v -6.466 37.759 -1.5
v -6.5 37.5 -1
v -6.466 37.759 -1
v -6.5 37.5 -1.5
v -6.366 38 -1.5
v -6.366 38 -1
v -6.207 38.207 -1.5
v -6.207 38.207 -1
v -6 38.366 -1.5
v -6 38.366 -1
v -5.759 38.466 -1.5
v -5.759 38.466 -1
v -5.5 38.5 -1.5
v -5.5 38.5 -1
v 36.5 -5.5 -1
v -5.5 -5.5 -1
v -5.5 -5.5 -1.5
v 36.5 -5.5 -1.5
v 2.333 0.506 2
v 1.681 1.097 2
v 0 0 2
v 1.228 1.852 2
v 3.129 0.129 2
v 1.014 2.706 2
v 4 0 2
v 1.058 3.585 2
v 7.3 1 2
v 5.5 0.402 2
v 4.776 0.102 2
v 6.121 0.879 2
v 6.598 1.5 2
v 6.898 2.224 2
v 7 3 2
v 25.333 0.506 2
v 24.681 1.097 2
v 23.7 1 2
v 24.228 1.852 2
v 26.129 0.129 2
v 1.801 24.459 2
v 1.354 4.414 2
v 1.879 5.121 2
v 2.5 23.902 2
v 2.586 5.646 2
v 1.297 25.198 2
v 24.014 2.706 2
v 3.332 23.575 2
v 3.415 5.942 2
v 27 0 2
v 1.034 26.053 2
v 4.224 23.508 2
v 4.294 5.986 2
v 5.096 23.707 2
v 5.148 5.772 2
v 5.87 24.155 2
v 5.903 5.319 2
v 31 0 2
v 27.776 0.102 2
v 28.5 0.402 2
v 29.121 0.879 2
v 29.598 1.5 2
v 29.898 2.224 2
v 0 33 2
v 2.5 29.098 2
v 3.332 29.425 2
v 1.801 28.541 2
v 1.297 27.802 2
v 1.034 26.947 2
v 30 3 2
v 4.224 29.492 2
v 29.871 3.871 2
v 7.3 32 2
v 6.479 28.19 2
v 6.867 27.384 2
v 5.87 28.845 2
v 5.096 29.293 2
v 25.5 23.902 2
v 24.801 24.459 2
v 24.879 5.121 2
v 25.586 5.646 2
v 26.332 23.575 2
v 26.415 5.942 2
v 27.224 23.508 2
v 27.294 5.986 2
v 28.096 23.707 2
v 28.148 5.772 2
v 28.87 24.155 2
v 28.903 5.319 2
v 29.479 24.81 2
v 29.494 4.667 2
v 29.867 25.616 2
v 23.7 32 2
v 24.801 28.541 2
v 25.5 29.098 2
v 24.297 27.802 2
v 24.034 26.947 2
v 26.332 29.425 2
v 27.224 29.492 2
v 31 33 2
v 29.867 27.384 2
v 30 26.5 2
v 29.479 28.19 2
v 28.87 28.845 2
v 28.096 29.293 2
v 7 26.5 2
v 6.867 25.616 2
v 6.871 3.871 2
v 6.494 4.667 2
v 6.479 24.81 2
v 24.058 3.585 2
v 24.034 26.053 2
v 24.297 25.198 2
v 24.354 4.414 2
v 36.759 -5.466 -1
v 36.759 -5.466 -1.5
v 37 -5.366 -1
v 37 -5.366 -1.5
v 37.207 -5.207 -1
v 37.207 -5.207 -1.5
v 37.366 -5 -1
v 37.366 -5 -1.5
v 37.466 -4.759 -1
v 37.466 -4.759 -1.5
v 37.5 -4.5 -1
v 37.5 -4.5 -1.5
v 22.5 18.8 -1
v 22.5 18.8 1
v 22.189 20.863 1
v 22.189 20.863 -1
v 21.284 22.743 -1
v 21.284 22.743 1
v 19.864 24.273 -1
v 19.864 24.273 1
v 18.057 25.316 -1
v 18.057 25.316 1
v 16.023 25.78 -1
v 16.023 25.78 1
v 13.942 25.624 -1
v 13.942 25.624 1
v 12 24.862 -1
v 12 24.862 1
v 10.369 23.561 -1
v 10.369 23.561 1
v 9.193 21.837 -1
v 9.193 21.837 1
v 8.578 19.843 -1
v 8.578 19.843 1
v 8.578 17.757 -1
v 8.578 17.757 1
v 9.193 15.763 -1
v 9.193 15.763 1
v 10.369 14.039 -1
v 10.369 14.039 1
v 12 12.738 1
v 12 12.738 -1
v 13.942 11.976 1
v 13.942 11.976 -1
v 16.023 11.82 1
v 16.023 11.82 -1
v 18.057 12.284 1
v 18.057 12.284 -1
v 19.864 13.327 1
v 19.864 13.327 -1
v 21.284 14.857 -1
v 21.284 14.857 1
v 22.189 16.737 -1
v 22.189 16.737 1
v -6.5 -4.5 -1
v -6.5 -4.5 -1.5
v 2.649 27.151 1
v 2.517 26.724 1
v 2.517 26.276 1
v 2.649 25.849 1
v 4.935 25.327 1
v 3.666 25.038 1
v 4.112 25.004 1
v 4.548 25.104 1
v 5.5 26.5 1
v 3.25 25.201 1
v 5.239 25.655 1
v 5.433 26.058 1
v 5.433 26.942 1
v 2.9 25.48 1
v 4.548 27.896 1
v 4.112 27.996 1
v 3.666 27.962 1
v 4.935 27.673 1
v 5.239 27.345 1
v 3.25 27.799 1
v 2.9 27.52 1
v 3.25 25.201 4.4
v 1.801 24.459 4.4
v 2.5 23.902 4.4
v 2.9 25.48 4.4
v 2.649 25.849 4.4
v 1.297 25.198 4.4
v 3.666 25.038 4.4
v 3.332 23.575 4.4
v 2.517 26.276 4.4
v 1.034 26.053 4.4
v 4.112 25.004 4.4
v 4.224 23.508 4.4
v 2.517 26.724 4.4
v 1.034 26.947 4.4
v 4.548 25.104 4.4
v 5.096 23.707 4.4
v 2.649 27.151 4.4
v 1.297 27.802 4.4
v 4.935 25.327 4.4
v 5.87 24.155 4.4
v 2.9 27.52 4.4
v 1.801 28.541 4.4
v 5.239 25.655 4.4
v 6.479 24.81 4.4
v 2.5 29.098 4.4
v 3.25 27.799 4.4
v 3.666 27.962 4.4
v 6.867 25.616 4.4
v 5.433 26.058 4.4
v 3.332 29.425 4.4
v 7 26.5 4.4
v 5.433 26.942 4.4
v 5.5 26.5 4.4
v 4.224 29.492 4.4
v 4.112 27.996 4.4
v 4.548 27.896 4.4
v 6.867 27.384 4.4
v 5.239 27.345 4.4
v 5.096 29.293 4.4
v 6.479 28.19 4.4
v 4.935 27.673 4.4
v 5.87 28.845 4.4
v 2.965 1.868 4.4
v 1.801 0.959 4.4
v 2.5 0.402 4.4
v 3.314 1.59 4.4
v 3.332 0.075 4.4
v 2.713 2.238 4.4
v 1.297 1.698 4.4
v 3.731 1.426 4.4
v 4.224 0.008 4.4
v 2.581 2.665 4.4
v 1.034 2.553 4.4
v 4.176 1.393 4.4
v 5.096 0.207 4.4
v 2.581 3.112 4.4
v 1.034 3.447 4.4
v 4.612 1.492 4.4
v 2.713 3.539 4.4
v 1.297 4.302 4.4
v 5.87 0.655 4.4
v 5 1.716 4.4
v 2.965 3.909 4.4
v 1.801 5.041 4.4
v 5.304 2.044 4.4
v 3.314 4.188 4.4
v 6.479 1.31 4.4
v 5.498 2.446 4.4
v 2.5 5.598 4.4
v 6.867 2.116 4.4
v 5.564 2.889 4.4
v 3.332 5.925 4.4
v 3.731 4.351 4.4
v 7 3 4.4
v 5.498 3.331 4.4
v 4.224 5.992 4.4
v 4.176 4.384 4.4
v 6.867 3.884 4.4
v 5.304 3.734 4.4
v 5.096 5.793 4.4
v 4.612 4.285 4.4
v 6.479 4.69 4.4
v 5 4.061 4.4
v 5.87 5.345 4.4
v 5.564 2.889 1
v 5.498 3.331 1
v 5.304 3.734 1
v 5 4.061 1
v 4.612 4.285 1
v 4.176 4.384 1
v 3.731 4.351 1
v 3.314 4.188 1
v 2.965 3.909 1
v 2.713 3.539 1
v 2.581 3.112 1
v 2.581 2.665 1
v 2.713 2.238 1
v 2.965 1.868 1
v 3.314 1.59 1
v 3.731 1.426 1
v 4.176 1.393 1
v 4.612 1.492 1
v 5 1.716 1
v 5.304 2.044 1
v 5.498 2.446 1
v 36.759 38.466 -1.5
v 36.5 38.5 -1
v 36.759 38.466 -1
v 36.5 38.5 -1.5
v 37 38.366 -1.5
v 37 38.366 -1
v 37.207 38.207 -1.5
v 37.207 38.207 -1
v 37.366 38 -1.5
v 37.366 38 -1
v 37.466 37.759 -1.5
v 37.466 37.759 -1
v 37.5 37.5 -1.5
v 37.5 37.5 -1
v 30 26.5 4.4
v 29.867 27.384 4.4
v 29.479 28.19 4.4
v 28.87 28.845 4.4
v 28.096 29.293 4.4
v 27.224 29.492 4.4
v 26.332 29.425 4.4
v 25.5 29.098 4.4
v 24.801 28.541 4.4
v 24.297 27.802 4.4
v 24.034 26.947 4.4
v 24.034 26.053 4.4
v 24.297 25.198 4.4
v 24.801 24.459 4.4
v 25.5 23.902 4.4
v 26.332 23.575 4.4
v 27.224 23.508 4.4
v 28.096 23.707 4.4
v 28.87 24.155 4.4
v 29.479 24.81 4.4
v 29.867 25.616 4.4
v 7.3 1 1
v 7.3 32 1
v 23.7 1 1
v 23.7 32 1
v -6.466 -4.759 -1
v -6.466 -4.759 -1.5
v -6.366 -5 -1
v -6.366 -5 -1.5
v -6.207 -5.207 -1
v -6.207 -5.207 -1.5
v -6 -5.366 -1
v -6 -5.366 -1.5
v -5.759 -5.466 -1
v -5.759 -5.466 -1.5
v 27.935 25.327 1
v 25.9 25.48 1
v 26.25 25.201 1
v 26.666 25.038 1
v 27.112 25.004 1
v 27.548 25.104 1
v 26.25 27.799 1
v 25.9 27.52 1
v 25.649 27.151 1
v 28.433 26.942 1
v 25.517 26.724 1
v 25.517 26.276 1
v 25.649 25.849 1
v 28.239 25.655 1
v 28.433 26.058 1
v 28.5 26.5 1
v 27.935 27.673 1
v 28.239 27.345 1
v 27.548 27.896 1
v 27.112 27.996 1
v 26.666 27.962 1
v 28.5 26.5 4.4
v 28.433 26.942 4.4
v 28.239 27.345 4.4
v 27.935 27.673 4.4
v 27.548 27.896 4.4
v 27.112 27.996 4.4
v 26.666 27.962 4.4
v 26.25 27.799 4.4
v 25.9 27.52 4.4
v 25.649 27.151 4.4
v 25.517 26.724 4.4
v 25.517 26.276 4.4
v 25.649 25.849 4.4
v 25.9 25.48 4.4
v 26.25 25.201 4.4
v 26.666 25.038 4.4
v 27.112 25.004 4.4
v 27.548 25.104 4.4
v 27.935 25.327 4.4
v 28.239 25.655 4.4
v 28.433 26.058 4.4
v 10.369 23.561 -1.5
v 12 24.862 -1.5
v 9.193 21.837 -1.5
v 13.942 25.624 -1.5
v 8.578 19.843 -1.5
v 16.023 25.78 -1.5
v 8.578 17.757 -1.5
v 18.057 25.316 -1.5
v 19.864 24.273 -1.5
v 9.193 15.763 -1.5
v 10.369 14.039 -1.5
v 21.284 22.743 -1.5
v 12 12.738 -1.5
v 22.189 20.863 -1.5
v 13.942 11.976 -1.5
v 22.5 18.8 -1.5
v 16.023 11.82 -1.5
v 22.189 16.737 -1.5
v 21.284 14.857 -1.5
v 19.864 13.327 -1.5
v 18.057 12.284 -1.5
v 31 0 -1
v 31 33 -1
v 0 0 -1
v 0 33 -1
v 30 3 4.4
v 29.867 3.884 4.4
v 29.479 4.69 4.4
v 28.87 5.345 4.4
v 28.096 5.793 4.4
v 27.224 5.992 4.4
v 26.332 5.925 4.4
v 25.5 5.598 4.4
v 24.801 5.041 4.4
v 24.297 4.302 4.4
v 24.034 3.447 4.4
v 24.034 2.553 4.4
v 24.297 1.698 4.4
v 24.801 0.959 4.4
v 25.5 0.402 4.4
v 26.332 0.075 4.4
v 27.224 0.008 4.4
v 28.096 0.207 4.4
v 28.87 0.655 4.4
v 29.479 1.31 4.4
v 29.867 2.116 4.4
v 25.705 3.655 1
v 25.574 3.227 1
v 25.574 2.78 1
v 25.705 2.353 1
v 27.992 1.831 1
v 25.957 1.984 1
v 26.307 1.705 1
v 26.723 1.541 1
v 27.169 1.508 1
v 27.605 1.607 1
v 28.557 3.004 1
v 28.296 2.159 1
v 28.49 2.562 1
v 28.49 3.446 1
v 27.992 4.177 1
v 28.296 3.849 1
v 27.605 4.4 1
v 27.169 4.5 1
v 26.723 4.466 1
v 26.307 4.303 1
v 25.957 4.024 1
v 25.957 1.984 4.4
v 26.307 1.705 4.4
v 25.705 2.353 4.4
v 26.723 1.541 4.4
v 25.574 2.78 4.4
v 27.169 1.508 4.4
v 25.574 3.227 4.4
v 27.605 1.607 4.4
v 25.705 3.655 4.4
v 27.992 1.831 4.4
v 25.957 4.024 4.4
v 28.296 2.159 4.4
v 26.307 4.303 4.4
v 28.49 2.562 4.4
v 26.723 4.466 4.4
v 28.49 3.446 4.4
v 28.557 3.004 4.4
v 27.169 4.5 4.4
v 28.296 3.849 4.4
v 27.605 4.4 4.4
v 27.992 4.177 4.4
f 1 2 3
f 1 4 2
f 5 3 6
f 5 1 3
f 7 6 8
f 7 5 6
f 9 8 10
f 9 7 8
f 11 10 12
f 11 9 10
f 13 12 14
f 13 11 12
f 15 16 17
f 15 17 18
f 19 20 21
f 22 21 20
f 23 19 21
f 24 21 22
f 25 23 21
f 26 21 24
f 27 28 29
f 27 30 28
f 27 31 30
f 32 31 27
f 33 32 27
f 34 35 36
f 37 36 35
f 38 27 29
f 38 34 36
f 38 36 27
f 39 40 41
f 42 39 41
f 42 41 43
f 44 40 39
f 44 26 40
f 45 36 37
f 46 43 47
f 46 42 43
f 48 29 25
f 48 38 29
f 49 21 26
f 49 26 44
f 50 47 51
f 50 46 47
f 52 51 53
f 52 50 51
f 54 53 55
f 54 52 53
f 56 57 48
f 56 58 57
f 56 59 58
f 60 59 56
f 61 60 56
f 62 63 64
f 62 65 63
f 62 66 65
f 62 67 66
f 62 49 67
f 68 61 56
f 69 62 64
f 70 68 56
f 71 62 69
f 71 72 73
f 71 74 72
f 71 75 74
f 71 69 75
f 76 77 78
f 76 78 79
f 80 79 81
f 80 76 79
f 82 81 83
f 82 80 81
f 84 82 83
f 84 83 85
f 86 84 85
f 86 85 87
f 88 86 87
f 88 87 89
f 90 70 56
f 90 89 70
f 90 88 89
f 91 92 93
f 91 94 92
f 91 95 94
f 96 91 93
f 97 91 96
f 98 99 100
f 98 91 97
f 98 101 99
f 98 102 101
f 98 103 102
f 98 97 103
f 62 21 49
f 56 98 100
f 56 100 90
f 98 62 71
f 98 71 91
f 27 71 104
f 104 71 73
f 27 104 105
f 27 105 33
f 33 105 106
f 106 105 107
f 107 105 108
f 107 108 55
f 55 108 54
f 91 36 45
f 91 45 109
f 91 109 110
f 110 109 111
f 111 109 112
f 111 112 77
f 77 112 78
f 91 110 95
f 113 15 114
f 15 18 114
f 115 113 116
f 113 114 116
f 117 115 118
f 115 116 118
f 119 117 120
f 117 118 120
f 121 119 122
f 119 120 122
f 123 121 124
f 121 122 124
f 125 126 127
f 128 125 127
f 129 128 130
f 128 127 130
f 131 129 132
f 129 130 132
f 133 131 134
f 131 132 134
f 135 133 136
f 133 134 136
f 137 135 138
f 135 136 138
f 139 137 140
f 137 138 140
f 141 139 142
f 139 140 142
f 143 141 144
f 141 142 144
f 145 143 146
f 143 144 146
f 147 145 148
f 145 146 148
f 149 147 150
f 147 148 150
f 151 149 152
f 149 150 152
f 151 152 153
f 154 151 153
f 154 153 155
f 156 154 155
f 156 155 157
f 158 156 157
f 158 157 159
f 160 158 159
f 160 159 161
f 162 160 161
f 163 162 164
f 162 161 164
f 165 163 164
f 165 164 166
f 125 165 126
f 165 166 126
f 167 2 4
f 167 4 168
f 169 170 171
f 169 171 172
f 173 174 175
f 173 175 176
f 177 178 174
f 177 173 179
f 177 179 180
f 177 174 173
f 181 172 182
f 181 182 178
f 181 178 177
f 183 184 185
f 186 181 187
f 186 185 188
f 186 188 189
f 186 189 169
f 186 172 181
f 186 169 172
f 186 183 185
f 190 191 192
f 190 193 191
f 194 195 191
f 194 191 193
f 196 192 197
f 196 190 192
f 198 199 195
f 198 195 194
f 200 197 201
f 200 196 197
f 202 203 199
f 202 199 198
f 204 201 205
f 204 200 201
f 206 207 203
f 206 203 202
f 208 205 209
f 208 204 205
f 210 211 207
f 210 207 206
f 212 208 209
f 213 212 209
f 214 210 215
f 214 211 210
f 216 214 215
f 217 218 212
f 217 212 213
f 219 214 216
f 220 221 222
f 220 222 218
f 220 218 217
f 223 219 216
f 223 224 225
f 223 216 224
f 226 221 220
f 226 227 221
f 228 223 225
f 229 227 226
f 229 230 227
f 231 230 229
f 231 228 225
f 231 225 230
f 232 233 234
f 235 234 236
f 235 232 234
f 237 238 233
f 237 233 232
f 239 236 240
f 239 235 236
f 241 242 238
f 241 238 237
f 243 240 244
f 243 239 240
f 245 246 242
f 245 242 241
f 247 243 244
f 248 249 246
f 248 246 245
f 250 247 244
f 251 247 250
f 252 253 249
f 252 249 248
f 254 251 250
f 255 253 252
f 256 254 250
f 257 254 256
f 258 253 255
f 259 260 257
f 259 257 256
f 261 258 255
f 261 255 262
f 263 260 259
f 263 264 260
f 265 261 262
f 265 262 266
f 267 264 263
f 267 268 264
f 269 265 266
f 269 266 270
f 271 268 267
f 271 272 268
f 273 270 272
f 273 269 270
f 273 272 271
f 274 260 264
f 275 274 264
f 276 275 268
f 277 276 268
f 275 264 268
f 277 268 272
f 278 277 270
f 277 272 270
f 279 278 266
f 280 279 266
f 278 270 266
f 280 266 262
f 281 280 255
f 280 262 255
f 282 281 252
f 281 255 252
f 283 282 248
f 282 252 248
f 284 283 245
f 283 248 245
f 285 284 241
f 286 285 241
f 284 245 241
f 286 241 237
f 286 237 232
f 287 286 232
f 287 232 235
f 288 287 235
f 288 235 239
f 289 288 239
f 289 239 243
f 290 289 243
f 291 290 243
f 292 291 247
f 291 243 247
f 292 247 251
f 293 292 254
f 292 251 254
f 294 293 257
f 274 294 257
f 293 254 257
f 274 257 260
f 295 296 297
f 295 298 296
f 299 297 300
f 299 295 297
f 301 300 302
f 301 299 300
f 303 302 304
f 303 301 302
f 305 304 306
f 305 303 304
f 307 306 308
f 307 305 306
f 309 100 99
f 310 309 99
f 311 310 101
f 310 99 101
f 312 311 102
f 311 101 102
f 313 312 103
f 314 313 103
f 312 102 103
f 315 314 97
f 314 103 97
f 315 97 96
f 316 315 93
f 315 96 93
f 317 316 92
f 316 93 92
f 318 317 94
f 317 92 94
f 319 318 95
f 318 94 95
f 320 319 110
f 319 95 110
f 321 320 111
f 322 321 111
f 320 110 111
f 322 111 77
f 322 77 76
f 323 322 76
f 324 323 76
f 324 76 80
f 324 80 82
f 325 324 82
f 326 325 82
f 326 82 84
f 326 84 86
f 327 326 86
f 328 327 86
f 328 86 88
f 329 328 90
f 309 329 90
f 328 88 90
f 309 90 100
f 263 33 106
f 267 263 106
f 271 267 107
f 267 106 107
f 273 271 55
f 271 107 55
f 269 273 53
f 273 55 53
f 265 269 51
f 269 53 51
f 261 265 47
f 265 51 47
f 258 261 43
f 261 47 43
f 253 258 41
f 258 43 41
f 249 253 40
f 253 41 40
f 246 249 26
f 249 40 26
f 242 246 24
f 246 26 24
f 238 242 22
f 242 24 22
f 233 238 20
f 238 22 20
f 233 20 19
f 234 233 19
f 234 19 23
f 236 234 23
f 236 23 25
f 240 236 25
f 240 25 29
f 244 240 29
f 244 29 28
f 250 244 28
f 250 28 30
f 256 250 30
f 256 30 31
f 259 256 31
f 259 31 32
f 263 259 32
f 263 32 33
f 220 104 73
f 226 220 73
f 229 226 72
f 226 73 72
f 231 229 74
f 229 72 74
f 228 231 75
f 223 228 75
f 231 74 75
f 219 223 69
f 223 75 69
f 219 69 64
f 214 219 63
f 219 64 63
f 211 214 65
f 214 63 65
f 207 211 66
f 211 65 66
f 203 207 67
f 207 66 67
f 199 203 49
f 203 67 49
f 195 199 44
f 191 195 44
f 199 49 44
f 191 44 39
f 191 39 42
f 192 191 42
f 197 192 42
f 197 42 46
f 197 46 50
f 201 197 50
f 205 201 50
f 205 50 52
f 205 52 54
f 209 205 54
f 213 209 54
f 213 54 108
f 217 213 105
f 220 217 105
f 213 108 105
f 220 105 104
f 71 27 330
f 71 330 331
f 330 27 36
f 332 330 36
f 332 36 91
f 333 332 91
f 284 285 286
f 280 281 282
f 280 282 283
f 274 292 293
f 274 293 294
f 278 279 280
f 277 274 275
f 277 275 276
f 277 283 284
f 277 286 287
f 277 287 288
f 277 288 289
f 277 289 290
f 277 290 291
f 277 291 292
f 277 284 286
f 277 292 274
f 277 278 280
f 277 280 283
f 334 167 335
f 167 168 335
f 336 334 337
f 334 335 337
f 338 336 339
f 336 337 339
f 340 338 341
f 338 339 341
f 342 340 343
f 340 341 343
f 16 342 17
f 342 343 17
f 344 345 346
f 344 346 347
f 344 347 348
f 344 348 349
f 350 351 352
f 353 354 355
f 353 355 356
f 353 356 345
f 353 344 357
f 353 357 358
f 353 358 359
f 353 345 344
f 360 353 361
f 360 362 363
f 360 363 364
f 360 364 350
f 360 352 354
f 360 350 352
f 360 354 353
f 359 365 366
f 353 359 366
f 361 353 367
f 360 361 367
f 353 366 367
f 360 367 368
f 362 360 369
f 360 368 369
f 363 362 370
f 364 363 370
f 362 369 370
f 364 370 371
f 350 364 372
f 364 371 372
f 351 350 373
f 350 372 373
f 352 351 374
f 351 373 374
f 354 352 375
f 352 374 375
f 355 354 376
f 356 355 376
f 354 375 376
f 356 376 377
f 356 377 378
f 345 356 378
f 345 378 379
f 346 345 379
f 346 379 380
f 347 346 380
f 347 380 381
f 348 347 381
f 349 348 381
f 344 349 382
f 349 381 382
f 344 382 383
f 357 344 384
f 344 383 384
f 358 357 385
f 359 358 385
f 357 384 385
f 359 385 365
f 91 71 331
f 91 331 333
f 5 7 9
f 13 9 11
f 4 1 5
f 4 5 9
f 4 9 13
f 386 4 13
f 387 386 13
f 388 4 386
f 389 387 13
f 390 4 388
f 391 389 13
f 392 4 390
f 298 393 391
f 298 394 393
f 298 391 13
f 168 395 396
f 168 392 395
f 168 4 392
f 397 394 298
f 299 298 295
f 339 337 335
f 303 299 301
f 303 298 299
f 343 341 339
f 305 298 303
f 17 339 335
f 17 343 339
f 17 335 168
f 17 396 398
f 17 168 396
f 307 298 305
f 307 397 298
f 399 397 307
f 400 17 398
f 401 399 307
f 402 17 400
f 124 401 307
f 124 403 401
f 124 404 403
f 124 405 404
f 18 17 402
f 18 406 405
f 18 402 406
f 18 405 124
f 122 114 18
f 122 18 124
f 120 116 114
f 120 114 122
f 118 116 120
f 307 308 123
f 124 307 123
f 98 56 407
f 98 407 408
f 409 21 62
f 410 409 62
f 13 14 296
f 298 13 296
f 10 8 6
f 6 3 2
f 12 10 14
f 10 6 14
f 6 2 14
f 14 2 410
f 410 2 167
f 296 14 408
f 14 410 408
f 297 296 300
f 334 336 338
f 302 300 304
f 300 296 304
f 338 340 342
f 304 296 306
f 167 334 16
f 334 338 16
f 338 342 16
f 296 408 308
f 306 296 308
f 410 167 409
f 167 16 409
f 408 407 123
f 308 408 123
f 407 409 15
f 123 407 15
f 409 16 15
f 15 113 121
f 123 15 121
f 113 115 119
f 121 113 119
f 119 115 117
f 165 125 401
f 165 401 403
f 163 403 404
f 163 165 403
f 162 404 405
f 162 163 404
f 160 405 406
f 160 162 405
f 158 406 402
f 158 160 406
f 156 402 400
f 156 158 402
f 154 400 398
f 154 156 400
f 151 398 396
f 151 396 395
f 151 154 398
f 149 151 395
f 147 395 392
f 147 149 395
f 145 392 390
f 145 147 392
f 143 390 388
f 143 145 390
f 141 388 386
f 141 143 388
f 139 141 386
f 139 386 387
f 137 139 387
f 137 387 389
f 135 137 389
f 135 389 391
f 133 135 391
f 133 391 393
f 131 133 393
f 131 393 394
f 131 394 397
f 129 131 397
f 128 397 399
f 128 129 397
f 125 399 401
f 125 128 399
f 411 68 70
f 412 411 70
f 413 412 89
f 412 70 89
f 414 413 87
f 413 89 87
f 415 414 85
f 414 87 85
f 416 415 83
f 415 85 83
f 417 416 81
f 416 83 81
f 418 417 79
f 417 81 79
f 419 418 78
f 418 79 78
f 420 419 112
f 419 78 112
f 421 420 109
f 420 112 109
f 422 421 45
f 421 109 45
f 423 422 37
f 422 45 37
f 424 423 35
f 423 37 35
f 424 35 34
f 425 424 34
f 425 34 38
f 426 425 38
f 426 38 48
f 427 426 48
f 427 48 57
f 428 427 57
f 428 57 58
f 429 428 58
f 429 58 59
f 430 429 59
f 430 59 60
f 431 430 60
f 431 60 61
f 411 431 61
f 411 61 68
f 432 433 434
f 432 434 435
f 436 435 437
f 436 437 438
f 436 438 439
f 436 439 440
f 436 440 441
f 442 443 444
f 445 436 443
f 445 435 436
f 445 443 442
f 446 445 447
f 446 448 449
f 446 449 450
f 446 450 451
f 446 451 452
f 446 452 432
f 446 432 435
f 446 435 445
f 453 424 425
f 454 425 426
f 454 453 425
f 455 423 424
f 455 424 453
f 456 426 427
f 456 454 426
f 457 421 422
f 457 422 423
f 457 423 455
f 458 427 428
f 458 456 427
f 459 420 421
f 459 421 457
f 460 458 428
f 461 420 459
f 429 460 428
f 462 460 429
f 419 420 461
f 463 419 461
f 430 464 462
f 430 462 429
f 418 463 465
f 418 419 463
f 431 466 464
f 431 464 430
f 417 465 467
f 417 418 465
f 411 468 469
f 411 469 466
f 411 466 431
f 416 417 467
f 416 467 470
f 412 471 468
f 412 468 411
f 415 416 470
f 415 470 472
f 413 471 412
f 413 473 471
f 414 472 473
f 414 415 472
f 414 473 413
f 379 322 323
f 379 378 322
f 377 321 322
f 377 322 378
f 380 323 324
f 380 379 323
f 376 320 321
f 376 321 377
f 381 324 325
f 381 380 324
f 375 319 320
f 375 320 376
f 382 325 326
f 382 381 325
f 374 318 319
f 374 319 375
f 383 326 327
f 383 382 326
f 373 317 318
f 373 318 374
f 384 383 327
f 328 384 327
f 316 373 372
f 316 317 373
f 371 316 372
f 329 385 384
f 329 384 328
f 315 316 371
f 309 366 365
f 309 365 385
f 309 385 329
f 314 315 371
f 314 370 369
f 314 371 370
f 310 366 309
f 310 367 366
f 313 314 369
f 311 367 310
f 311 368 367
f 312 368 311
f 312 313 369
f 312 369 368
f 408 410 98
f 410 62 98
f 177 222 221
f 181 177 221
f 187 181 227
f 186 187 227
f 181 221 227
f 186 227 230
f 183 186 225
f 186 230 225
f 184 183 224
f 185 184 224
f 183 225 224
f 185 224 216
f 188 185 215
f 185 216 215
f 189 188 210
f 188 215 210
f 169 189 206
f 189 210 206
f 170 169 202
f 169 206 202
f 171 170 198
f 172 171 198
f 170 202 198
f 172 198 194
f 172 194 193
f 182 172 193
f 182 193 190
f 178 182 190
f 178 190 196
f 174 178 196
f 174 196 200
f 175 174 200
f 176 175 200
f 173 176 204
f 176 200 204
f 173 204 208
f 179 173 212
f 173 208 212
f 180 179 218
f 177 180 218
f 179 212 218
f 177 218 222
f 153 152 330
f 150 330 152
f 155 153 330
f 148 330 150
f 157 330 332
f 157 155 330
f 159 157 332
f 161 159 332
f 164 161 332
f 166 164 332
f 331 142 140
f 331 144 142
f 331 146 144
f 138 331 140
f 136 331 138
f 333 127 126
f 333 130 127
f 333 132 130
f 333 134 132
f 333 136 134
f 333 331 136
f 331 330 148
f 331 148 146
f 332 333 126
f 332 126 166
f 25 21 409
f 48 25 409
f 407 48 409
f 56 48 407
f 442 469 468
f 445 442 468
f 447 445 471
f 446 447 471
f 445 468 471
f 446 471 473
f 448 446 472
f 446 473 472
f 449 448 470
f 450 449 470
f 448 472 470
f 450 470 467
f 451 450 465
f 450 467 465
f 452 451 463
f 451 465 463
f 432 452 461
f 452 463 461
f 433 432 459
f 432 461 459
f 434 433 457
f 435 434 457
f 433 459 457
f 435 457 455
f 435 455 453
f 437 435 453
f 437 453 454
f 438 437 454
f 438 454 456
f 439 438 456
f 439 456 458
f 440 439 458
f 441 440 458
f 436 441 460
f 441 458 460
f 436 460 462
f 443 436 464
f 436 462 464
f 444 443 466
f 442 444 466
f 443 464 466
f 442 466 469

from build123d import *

# Parameters (mm, degrees)
F0_W      = 31
F0_H      = 33
F1_DEPTH  = 2
F2_R      = 3
F3_DEPTH  = 2.4
F4_W      = 16.4
F4_H      = 31
F5_DEPTH  = 1
F6_R      = 1.5
F7_DEPTH  = 3.4
F8_R      = 1.5
F9_DEPTH  = 3.4
F10_R     = 7
F11_DEPTH = 25
F12_DEPTH = 1
F13_W     = 44
F13_H     = 44
F13_W_2   = 31
F13_H_2   = 33
F13_R     = 7
F14_DEPTH = 0.5
F15_R     = 1


with BuildPart() as f1:
    # F0 (on Top) → F1 (new body)
    with BuildSketch(Plane.XY):
        with Locations((15.5, 16.5)):
            Rectangle(F0_W, F0_H)
    extrude(amount=F1_DEPTH)

    # F2 (on face) → F3 (join)
    with BuildSketch(Plane.XY.offset(2)):
        with Locations((4, 3)):
            Circle(F2_R)
        with Locations((4, 26.5)):
            Circle(F2_R)
        with Locations((27, 26.5)):
            Circle(F2_R)
        with Locations((27, 3)):
            Circle(F2_R)
    extrude(amount=F3_DEPTH)

    # F4 (on face) → F5 (cut)
    with BuildSketch(Plane.XY.offset(2)):
        with Locations((15.5, 16.5)):
            Rectangle(F4_W, F4_H)
    extrude(amount=-F5_DEPTH, mode=Mode.SUBTRACT)

    # F6 (on face) → F7 (cut)
    with BuildSketch(Plane.XY.offset(4.4)):
        with Locations((27, 26.5)):
            Circle(F6_R)
    extrude(amount=-F7_DEPTH, mode=Mode.SUBTRACT)

    # F8 (on face) → F9 (cut)
    with BuildSketch(Plane.XY.offset(4.4)):
        with Locations((4, 26.5)):
            Circle(F8_R)
        with Locations((4.0643862449, 2.8885749634)):
            Circle(F8_R)
        with Locations((27.0567759871, 3.0037942342)):
            Circle(F8_R)
    extrude(amount=-F9_DEPTH, mode=Mode.SUBTRACT)

    # F10 (on face) → F11 (cut)
    with BuildSketch(Plane.XY.offset(1)):
        with Locations((15.5, 18.8)):
            Circle(F10_R)
    extrude(amount=-F11_DEPTH, mode=Mode.SUBTRACT)

    # F12 (add): a face of the model
    f12_faces = [f1.faces().sort_by_distance(p)[0] for p in [
        (0.4527692569, 16.5, 0),
    ]]
    extrude(f12_faces, amount=F12_DEPTH)

    # F13 (on face) → F14 (join)
    with BuildSketch(Plane(origin=(0, 0, -1), x_dir=(1, 0, 0), z_dir=(0, 0, -1))):
        with Locations((15.5, -16.5)):
            Rectangle(F13_W, F13_H)
        with Locations((15.5, -16.5)):
            Rectangle(F13_W_2, F13_H_2, mode=Mode.SUBTRACT)
        with Locations((15.5, -16.5)):
            Rectangle(F13_W_2, F13_H_2)
        with Locations((15.5, -18.8)):
            Circle(F13_R, mode=Mode.SUBTRACT)
    extrude(amount=F14_DEPTH)

    # F15
    f15_edges = [f1.edges().sort_by_distance(p)[0] for p in [
        (-6.5, -5.5, -1.25),
        (37.5, -5.5, -1.25),
        (37.5, 38.5, -1.25),
        (-6.5, 38.5, -1.25),
    ]]
    fillet(f15_edges, radius=F15_R)


solid = f1.part
